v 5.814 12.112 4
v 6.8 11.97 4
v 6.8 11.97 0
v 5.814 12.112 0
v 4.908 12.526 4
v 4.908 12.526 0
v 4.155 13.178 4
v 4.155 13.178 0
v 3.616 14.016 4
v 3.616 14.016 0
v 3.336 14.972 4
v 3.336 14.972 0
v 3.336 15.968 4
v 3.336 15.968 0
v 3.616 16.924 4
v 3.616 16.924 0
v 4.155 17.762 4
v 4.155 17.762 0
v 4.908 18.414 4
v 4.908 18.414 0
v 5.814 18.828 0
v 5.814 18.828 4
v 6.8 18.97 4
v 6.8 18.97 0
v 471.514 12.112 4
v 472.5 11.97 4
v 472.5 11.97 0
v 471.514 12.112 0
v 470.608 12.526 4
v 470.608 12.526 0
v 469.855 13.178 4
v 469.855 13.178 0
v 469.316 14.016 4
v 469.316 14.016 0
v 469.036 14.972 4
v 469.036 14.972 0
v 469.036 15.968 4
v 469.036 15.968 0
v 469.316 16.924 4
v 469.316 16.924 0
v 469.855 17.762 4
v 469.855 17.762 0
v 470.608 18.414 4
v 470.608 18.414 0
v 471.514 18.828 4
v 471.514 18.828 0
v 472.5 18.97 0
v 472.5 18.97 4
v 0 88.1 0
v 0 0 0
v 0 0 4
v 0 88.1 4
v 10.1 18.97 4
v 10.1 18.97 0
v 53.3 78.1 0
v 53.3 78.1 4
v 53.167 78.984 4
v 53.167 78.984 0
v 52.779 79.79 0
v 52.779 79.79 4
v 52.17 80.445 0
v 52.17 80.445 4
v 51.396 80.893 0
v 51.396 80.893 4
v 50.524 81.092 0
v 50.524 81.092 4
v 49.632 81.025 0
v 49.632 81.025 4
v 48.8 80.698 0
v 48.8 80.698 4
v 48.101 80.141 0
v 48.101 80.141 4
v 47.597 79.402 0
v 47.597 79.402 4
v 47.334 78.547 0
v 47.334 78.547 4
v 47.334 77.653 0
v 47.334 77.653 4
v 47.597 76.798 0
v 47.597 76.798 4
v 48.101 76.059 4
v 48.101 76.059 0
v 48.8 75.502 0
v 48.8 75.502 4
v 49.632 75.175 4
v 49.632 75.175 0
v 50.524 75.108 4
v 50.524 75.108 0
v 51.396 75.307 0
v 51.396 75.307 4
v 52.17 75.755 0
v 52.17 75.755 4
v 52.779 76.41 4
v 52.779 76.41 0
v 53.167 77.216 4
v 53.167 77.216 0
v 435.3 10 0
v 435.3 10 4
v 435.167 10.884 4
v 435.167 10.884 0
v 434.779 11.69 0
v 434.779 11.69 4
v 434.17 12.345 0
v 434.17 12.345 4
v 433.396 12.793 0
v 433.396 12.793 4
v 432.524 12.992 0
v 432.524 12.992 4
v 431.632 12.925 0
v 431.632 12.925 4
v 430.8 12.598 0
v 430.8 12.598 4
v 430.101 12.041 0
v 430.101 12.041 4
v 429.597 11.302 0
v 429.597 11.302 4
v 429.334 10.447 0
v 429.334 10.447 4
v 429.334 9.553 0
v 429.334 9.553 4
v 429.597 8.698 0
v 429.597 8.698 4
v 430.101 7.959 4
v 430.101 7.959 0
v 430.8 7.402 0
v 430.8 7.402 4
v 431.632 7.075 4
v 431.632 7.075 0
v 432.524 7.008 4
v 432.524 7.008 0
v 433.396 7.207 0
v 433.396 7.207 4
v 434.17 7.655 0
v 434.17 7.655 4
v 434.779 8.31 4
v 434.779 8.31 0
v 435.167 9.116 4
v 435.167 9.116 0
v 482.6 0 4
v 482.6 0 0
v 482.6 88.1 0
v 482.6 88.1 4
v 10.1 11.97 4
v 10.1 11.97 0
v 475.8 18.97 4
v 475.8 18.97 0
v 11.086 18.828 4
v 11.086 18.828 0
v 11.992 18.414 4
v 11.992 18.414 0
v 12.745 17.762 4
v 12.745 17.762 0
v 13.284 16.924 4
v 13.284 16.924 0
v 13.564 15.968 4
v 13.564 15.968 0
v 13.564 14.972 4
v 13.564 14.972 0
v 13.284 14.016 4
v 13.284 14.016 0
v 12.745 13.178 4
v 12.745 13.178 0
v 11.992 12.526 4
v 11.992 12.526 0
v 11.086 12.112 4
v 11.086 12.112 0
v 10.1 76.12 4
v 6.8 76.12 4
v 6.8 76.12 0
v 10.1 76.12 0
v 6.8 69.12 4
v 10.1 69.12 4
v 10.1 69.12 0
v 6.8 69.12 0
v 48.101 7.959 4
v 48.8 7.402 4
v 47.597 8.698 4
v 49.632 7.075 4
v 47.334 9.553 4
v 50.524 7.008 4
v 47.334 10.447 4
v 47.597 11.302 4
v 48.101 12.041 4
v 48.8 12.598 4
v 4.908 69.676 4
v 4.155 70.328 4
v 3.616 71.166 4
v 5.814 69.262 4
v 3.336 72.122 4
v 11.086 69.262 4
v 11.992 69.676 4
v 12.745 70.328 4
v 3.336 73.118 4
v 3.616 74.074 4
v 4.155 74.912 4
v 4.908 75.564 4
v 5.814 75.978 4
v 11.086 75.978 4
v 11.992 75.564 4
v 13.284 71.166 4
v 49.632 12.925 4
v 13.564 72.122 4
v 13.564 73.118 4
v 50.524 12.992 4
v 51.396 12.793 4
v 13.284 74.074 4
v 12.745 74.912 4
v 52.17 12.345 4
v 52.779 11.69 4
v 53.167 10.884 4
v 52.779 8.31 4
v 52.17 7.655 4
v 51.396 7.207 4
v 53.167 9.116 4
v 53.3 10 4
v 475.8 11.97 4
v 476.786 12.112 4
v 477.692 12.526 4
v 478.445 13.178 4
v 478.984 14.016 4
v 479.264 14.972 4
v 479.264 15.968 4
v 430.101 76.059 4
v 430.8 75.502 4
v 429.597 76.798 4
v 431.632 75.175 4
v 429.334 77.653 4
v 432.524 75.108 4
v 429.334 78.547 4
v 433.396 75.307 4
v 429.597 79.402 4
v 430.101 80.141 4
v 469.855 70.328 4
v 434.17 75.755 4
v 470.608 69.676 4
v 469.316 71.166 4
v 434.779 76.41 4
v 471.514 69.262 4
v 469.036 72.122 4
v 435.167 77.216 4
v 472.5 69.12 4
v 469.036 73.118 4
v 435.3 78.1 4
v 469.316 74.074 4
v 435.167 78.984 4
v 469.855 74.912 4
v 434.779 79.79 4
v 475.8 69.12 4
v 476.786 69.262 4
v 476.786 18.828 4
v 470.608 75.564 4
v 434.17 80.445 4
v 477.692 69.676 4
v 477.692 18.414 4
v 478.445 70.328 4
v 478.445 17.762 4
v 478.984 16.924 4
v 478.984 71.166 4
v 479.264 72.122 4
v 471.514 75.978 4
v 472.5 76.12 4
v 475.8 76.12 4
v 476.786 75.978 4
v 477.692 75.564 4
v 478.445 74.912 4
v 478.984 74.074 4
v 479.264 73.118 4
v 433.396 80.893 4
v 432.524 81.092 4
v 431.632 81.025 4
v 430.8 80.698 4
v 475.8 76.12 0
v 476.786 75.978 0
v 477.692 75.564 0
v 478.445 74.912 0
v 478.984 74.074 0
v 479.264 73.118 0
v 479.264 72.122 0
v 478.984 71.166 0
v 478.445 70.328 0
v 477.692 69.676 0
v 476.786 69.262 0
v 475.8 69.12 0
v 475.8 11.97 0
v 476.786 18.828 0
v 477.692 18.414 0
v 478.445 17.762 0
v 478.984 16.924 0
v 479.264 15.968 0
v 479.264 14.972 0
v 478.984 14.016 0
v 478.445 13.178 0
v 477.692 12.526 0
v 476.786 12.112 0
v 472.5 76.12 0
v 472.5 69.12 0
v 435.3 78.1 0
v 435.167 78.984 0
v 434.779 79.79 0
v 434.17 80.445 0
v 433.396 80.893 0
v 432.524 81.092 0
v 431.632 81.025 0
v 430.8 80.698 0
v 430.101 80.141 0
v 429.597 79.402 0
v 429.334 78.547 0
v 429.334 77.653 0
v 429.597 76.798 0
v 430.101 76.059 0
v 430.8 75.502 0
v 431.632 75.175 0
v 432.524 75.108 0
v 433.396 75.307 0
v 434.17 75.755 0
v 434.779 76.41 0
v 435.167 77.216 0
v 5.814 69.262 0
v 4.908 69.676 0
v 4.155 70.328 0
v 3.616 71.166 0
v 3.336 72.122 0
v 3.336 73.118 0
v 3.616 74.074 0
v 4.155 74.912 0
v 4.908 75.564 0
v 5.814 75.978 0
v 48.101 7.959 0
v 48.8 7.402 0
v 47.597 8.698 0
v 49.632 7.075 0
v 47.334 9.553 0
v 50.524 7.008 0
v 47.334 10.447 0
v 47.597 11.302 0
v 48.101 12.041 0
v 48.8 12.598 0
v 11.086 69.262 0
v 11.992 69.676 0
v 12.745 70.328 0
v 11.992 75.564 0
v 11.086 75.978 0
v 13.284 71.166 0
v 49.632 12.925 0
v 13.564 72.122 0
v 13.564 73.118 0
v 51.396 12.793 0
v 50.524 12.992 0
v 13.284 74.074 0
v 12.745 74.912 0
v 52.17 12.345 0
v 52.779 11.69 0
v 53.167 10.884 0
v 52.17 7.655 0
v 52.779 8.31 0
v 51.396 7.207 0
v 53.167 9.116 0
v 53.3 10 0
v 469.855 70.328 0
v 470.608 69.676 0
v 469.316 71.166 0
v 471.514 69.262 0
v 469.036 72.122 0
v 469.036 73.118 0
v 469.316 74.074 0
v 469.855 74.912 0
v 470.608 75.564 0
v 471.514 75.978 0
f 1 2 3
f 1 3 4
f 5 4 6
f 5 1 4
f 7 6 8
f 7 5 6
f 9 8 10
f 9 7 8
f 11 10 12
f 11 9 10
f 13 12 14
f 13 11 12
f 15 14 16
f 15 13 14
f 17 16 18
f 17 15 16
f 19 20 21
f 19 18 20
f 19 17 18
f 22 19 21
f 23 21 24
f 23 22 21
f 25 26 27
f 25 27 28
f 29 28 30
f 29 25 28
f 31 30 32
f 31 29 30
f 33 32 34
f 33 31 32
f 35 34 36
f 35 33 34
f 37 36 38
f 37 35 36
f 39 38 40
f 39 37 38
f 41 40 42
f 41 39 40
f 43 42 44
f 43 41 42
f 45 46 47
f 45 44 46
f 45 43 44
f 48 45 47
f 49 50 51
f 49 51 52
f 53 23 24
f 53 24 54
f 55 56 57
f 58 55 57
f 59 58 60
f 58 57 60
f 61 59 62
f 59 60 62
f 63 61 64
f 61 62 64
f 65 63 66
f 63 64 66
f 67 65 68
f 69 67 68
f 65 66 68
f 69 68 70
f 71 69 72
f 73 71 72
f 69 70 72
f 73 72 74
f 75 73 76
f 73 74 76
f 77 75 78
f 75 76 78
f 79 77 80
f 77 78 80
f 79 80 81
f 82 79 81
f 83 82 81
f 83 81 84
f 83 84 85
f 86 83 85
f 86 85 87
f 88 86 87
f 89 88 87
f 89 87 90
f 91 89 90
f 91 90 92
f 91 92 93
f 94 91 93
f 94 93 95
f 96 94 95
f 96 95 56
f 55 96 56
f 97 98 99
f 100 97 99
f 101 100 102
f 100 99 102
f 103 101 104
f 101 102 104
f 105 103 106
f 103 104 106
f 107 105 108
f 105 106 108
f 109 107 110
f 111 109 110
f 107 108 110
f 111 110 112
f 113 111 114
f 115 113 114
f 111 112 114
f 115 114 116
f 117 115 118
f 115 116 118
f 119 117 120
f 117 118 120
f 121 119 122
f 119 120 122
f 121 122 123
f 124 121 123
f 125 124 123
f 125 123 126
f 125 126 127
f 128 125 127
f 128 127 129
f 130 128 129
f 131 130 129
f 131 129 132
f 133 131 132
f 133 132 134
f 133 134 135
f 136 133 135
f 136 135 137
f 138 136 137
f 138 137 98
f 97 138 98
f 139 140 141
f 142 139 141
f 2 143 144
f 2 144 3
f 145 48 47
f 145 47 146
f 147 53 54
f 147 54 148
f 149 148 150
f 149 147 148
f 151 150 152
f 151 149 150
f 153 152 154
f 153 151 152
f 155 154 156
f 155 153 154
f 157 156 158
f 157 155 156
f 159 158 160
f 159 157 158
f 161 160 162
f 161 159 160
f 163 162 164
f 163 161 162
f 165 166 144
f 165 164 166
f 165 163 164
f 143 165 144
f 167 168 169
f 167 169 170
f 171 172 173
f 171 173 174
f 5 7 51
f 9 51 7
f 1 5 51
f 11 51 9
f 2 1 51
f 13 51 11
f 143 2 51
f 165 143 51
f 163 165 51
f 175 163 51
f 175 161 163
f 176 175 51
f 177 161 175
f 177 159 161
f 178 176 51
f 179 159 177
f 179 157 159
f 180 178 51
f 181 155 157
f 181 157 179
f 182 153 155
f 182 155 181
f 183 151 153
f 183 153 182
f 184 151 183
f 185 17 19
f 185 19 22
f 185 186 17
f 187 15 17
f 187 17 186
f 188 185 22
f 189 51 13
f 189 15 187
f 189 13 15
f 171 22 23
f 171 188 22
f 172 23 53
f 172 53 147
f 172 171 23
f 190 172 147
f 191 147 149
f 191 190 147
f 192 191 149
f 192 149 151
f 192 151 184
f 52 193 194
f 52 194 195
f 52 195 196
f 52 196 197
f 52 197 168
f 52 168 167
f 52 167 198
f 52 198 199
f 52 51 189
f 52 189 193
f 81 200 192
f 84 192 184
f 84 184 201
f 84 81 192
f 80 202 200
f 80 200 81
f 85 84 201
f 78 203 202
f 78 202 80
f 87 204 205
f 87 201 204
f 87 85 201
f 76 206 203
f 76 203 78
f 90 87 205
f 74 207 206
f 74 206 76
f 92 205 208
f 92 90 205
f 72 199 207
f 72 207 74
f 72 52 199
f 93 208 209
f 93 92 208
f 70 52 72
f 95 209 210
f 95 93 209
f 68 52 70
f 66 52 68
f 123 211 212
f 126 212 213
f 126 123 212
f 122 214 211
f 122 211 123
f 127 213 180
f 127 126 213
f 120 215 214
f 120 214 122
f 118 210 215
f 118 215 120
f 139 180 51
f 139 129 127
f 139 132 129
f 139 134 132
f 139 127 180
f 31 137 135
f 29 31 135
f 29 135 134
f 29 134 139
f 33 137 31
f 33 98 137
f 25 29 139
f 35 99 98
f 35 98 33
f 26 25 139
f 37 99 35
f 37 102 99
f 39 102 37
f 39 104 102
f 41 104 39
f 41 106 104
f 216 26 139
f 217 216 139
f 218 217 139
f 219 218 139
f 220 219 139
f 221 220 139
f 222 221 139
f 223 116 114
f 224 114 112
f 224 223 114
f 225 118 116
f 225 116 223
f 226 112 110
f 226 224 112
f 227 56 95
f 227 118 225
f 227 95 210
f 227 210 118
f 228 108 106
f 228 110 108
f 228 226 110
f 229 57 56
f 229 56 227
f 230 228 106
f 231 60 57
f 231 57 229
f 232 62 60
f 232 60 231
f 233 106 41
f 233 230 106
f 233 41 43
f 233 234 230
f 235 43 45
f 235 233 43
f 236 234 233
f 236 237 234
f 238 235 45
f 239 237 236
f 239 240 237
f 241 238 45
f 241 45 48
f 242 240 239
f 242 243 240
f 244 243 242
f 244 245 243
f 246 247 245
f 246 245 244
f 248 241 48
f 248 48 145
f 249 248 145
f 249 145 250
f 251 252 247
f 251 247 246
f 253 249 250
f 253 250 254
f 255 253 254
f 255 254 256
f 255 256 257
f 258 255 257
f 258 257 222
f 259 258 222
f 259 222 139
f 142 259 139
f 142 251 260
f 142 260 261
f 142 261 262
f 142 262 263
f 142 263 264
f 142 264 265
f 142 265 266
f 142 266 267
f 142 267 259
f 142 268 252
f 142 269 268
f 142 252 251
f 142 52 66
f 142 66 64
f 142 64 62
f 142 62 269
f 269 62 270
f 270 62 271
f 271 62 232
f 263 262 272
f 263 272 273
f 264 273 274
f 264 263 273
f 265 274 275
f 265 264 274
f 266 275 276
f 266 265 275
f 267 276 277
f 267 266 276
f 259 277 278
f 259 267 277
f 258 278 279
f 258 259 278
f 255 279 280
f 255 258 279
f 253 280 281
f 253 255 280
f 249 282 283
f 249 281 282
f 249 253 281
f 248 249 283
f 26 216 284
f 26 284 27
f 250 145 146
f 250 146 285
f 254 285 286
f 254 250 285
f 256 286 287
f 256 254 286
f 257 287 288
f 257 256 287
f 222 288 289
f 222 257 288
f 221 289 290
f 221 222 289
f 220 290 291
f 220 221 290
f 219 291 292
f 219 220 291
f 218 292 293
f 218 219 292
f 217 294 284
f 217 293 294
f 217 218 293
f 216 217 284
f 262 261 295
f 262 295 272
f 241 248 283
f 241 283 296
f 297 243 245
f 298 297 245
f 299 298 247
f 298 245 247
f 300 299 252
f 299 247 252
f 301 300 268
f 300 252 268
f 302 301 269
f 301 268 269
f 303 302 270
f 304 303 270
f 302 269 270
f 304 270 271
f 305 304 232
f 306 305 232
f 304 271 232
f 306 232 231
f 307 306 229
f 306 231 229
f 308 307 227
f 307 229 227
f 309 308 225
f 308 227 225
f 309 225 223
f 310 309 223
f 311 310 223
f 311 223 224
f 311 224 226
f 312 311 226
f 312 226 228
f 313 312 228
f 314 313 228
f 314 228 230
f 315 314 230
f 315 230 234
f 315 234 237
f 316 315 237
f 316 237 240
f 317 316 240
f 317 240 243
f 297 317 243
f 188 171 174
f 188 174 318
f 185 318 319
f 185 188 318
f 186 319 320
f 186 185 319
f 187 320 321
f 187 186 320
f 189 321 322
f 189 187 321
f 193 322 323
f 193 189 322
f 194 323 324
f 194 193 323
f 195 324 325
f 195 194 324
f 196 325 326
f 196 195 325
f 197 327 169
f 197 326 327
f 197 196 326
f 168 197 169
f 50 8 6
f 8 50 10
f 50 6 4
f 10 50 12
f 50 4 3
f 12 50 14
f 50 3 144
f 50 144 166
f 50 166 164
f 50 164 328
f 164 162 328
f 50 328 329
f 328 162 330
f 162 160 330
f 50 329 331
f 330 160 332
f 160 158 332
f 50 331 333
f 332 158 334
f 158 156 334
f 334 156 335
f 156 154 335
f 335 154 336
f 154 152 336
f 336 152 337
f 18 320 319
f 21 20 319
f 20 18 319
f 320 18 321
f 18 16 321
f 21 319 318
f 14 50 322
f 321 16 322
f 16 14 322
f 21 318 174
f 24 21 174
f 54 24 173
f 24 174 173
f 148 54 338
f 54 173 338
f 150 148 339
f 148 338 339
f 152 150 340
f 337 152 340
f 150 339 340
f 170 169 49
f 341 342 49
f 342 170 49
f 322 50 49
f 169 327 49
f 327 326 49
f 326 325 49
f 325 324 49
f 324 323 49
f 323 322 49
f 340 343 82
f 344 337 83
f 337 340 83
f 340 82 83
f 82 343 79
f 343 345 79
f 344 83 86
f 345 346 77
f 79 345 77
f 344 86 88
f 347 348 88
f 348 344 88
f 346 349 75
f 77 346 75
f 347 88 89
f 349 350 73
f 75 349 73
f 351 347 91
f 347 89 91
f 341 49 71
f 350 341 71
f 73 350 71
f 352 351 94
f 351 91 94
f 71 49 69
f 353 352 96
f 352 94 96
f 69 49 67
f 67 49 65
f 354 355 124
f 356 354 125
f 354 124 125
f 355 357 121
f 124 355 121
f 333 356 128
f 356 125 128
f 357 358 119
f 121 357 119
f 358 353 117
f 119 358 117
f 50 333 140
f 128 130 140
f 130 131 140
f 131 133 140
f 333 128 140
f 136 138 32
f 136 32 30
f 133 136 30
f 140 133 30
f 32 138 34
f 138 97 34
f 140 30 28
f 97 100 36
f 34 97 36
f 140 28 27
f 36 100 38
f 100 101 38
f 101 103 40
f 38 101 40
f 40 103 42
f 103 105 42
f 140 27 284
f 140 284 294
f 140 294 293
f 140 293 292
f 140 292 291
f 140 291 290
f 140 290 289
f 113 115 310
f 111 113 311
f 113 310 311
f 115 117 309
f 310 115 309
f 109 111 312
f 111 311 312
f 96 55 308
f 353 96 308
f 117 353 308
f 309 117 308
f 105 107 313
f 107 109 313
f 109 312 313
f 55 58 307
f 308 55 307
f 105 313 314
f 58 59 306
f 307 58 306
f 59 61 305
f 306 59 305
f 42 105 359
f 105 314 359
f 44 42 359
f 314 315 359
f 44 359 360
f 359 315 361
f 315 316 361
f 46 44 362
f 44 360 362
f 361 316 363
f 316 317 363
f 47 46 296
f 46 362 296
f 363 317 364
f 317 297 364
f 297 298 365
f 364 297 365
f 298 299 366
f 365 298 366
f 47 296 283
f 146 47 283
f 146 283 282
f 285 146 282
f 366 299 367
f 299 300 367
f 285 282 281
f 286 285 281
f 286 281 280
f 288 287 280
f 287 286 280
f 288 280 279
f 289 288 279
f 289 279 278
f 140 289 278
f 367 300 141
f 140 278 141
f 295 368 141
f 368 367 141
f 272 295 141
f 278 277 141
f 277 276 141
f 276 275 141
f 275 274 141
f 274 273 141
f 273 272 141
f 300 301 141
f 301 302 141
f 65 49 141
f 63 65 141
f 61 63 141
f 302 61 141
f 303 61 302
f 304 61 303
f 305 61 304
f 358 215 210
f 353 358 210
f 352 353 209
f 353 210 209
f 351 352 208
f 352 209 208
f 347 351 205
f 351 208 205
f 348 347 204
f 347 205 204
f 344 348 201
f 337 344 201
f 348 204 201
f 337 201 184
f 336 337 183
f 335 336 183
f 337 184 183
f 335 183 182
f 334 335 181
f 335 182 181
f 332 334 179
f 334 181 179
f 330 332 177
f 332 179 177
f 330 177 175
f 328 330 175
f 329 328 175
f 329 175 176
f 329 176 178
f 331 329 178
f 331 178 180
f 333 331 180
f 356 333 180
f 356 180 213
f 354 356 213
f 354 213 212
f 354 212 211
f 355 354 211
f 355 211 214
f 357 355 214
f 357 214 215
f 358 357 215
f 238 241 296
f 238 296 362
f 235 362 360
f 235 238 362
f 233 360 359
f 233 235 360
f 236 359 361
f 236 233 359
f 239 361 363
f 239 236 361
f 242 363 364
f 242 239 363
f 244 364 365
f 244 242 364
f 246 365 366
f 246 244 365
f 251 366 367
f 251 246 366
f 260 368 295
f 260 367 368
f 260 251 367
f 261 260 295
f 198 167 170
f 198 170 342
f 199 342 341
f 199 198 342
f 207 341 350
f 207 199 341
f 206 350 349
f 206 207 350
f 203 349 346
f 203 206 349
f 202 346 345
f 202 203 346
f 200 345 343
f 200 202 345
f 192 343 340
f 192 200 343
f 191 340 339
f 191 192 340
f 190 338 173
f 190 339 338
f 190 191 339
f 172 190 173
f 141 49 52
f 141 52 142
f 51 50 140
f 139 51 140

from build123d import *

# Parameters (mm, degrees)
SKETCH_1_W          = 482.6
SKETCH_1_H          = 88.1
EXTRUDE_1_DEPTH     = 4
CUT_EXTRUDE_1_DEPTH = 491.591856842
SKETCH_3_R          = 3
CUT_EXTRUDE_2_DEPTH = 491.591856842


with BuildPart() as part:
    # Эскиз1 → Бобышка-Вытянуть1 (new body)
    with BuildSketch(Plane.XY):
        with Locations((241.3, 44.05)):
            Rectangle(SKETCH_1_W, SKETCH_1_H)
    extrude(amount=EXTRUDE_1_DEPTH)

    # Эскиз2 → Вырез-Вытянуть1 (cut, through all)
    with BuildSketch(Plane.XY.offset(4)):
        with BuildLine():
            Line((6.8, 76.12), (10.1, 76.12))
            ThreePointArc((10.1, 76.12), (13.6, 72.62), (10.1, 69.12))
            Line((10.1, 69.12), (6.8, 69.12))
            ThreePointArc((6.8, 69.12), (3.3, 72.62), (6.8, 76.12))
        make_face()
        with BuildLine():
            Line((472.5, 76.12), (475.8, 76.12))
            ThreePointArc((475.8, 76.12), (479.3, 72.62), (475.8, 69.12))
            Line((475.8, 69.12), (472.5, 69.12))
            ThreePointArc((472.5, 69.12), (469, 72.62), (472.5, 76.12))
        make_face()
        with BuildLine():
            Line((472.5, 18.97), (475.8, 18.97))
            ThreePointArc((475.8, 18.97), (479.3, 15.47), (475.8, 11.97))
            Line((475.8, 11.97), (472.5, 11.97))
            ThreePointArc((472.5, 11.97), (469, 15.47), (472.5, 18.97))
        make_face()
        with BuildLine():
            Line((6.8, 18.97), (10.1, 18.97))
            ThreePointArc((10.1, 18.97), (13.6, 15.47), (10.1, 11.97))
            Line((10.1, 11.97), (6.8, 11.97))
            ThreePointArc((6.8, 11.97), (3.3, 15.47), (6.8, 18.97))
        make_face()
    extrude(amount=-CUT_EXTRUDE_1_DEPTH, mode=Mode.SUBTRACT)

    # Эскиз3 → Вырез-Вытянуть2 (cut, through all)
    with BuildSketch(Plane.XY.offset(4)):
        with Locations((50.3, 78.1)):
            Circle(SKETCH_3_R)
        with Locations((432.3, 78.1)):
            Circle(SKETCH_3_R)
        with Locations((432.3, 10)):
            Circle(SKETCH_3_R)
        with Locations((50.3, 10)):
            Circle(SKETCH_3_R)
    extrude(amount=-CUT_EXTRUDE_2_DEPTH, mode=Mode.SUBTRACT)


solid = part.part
